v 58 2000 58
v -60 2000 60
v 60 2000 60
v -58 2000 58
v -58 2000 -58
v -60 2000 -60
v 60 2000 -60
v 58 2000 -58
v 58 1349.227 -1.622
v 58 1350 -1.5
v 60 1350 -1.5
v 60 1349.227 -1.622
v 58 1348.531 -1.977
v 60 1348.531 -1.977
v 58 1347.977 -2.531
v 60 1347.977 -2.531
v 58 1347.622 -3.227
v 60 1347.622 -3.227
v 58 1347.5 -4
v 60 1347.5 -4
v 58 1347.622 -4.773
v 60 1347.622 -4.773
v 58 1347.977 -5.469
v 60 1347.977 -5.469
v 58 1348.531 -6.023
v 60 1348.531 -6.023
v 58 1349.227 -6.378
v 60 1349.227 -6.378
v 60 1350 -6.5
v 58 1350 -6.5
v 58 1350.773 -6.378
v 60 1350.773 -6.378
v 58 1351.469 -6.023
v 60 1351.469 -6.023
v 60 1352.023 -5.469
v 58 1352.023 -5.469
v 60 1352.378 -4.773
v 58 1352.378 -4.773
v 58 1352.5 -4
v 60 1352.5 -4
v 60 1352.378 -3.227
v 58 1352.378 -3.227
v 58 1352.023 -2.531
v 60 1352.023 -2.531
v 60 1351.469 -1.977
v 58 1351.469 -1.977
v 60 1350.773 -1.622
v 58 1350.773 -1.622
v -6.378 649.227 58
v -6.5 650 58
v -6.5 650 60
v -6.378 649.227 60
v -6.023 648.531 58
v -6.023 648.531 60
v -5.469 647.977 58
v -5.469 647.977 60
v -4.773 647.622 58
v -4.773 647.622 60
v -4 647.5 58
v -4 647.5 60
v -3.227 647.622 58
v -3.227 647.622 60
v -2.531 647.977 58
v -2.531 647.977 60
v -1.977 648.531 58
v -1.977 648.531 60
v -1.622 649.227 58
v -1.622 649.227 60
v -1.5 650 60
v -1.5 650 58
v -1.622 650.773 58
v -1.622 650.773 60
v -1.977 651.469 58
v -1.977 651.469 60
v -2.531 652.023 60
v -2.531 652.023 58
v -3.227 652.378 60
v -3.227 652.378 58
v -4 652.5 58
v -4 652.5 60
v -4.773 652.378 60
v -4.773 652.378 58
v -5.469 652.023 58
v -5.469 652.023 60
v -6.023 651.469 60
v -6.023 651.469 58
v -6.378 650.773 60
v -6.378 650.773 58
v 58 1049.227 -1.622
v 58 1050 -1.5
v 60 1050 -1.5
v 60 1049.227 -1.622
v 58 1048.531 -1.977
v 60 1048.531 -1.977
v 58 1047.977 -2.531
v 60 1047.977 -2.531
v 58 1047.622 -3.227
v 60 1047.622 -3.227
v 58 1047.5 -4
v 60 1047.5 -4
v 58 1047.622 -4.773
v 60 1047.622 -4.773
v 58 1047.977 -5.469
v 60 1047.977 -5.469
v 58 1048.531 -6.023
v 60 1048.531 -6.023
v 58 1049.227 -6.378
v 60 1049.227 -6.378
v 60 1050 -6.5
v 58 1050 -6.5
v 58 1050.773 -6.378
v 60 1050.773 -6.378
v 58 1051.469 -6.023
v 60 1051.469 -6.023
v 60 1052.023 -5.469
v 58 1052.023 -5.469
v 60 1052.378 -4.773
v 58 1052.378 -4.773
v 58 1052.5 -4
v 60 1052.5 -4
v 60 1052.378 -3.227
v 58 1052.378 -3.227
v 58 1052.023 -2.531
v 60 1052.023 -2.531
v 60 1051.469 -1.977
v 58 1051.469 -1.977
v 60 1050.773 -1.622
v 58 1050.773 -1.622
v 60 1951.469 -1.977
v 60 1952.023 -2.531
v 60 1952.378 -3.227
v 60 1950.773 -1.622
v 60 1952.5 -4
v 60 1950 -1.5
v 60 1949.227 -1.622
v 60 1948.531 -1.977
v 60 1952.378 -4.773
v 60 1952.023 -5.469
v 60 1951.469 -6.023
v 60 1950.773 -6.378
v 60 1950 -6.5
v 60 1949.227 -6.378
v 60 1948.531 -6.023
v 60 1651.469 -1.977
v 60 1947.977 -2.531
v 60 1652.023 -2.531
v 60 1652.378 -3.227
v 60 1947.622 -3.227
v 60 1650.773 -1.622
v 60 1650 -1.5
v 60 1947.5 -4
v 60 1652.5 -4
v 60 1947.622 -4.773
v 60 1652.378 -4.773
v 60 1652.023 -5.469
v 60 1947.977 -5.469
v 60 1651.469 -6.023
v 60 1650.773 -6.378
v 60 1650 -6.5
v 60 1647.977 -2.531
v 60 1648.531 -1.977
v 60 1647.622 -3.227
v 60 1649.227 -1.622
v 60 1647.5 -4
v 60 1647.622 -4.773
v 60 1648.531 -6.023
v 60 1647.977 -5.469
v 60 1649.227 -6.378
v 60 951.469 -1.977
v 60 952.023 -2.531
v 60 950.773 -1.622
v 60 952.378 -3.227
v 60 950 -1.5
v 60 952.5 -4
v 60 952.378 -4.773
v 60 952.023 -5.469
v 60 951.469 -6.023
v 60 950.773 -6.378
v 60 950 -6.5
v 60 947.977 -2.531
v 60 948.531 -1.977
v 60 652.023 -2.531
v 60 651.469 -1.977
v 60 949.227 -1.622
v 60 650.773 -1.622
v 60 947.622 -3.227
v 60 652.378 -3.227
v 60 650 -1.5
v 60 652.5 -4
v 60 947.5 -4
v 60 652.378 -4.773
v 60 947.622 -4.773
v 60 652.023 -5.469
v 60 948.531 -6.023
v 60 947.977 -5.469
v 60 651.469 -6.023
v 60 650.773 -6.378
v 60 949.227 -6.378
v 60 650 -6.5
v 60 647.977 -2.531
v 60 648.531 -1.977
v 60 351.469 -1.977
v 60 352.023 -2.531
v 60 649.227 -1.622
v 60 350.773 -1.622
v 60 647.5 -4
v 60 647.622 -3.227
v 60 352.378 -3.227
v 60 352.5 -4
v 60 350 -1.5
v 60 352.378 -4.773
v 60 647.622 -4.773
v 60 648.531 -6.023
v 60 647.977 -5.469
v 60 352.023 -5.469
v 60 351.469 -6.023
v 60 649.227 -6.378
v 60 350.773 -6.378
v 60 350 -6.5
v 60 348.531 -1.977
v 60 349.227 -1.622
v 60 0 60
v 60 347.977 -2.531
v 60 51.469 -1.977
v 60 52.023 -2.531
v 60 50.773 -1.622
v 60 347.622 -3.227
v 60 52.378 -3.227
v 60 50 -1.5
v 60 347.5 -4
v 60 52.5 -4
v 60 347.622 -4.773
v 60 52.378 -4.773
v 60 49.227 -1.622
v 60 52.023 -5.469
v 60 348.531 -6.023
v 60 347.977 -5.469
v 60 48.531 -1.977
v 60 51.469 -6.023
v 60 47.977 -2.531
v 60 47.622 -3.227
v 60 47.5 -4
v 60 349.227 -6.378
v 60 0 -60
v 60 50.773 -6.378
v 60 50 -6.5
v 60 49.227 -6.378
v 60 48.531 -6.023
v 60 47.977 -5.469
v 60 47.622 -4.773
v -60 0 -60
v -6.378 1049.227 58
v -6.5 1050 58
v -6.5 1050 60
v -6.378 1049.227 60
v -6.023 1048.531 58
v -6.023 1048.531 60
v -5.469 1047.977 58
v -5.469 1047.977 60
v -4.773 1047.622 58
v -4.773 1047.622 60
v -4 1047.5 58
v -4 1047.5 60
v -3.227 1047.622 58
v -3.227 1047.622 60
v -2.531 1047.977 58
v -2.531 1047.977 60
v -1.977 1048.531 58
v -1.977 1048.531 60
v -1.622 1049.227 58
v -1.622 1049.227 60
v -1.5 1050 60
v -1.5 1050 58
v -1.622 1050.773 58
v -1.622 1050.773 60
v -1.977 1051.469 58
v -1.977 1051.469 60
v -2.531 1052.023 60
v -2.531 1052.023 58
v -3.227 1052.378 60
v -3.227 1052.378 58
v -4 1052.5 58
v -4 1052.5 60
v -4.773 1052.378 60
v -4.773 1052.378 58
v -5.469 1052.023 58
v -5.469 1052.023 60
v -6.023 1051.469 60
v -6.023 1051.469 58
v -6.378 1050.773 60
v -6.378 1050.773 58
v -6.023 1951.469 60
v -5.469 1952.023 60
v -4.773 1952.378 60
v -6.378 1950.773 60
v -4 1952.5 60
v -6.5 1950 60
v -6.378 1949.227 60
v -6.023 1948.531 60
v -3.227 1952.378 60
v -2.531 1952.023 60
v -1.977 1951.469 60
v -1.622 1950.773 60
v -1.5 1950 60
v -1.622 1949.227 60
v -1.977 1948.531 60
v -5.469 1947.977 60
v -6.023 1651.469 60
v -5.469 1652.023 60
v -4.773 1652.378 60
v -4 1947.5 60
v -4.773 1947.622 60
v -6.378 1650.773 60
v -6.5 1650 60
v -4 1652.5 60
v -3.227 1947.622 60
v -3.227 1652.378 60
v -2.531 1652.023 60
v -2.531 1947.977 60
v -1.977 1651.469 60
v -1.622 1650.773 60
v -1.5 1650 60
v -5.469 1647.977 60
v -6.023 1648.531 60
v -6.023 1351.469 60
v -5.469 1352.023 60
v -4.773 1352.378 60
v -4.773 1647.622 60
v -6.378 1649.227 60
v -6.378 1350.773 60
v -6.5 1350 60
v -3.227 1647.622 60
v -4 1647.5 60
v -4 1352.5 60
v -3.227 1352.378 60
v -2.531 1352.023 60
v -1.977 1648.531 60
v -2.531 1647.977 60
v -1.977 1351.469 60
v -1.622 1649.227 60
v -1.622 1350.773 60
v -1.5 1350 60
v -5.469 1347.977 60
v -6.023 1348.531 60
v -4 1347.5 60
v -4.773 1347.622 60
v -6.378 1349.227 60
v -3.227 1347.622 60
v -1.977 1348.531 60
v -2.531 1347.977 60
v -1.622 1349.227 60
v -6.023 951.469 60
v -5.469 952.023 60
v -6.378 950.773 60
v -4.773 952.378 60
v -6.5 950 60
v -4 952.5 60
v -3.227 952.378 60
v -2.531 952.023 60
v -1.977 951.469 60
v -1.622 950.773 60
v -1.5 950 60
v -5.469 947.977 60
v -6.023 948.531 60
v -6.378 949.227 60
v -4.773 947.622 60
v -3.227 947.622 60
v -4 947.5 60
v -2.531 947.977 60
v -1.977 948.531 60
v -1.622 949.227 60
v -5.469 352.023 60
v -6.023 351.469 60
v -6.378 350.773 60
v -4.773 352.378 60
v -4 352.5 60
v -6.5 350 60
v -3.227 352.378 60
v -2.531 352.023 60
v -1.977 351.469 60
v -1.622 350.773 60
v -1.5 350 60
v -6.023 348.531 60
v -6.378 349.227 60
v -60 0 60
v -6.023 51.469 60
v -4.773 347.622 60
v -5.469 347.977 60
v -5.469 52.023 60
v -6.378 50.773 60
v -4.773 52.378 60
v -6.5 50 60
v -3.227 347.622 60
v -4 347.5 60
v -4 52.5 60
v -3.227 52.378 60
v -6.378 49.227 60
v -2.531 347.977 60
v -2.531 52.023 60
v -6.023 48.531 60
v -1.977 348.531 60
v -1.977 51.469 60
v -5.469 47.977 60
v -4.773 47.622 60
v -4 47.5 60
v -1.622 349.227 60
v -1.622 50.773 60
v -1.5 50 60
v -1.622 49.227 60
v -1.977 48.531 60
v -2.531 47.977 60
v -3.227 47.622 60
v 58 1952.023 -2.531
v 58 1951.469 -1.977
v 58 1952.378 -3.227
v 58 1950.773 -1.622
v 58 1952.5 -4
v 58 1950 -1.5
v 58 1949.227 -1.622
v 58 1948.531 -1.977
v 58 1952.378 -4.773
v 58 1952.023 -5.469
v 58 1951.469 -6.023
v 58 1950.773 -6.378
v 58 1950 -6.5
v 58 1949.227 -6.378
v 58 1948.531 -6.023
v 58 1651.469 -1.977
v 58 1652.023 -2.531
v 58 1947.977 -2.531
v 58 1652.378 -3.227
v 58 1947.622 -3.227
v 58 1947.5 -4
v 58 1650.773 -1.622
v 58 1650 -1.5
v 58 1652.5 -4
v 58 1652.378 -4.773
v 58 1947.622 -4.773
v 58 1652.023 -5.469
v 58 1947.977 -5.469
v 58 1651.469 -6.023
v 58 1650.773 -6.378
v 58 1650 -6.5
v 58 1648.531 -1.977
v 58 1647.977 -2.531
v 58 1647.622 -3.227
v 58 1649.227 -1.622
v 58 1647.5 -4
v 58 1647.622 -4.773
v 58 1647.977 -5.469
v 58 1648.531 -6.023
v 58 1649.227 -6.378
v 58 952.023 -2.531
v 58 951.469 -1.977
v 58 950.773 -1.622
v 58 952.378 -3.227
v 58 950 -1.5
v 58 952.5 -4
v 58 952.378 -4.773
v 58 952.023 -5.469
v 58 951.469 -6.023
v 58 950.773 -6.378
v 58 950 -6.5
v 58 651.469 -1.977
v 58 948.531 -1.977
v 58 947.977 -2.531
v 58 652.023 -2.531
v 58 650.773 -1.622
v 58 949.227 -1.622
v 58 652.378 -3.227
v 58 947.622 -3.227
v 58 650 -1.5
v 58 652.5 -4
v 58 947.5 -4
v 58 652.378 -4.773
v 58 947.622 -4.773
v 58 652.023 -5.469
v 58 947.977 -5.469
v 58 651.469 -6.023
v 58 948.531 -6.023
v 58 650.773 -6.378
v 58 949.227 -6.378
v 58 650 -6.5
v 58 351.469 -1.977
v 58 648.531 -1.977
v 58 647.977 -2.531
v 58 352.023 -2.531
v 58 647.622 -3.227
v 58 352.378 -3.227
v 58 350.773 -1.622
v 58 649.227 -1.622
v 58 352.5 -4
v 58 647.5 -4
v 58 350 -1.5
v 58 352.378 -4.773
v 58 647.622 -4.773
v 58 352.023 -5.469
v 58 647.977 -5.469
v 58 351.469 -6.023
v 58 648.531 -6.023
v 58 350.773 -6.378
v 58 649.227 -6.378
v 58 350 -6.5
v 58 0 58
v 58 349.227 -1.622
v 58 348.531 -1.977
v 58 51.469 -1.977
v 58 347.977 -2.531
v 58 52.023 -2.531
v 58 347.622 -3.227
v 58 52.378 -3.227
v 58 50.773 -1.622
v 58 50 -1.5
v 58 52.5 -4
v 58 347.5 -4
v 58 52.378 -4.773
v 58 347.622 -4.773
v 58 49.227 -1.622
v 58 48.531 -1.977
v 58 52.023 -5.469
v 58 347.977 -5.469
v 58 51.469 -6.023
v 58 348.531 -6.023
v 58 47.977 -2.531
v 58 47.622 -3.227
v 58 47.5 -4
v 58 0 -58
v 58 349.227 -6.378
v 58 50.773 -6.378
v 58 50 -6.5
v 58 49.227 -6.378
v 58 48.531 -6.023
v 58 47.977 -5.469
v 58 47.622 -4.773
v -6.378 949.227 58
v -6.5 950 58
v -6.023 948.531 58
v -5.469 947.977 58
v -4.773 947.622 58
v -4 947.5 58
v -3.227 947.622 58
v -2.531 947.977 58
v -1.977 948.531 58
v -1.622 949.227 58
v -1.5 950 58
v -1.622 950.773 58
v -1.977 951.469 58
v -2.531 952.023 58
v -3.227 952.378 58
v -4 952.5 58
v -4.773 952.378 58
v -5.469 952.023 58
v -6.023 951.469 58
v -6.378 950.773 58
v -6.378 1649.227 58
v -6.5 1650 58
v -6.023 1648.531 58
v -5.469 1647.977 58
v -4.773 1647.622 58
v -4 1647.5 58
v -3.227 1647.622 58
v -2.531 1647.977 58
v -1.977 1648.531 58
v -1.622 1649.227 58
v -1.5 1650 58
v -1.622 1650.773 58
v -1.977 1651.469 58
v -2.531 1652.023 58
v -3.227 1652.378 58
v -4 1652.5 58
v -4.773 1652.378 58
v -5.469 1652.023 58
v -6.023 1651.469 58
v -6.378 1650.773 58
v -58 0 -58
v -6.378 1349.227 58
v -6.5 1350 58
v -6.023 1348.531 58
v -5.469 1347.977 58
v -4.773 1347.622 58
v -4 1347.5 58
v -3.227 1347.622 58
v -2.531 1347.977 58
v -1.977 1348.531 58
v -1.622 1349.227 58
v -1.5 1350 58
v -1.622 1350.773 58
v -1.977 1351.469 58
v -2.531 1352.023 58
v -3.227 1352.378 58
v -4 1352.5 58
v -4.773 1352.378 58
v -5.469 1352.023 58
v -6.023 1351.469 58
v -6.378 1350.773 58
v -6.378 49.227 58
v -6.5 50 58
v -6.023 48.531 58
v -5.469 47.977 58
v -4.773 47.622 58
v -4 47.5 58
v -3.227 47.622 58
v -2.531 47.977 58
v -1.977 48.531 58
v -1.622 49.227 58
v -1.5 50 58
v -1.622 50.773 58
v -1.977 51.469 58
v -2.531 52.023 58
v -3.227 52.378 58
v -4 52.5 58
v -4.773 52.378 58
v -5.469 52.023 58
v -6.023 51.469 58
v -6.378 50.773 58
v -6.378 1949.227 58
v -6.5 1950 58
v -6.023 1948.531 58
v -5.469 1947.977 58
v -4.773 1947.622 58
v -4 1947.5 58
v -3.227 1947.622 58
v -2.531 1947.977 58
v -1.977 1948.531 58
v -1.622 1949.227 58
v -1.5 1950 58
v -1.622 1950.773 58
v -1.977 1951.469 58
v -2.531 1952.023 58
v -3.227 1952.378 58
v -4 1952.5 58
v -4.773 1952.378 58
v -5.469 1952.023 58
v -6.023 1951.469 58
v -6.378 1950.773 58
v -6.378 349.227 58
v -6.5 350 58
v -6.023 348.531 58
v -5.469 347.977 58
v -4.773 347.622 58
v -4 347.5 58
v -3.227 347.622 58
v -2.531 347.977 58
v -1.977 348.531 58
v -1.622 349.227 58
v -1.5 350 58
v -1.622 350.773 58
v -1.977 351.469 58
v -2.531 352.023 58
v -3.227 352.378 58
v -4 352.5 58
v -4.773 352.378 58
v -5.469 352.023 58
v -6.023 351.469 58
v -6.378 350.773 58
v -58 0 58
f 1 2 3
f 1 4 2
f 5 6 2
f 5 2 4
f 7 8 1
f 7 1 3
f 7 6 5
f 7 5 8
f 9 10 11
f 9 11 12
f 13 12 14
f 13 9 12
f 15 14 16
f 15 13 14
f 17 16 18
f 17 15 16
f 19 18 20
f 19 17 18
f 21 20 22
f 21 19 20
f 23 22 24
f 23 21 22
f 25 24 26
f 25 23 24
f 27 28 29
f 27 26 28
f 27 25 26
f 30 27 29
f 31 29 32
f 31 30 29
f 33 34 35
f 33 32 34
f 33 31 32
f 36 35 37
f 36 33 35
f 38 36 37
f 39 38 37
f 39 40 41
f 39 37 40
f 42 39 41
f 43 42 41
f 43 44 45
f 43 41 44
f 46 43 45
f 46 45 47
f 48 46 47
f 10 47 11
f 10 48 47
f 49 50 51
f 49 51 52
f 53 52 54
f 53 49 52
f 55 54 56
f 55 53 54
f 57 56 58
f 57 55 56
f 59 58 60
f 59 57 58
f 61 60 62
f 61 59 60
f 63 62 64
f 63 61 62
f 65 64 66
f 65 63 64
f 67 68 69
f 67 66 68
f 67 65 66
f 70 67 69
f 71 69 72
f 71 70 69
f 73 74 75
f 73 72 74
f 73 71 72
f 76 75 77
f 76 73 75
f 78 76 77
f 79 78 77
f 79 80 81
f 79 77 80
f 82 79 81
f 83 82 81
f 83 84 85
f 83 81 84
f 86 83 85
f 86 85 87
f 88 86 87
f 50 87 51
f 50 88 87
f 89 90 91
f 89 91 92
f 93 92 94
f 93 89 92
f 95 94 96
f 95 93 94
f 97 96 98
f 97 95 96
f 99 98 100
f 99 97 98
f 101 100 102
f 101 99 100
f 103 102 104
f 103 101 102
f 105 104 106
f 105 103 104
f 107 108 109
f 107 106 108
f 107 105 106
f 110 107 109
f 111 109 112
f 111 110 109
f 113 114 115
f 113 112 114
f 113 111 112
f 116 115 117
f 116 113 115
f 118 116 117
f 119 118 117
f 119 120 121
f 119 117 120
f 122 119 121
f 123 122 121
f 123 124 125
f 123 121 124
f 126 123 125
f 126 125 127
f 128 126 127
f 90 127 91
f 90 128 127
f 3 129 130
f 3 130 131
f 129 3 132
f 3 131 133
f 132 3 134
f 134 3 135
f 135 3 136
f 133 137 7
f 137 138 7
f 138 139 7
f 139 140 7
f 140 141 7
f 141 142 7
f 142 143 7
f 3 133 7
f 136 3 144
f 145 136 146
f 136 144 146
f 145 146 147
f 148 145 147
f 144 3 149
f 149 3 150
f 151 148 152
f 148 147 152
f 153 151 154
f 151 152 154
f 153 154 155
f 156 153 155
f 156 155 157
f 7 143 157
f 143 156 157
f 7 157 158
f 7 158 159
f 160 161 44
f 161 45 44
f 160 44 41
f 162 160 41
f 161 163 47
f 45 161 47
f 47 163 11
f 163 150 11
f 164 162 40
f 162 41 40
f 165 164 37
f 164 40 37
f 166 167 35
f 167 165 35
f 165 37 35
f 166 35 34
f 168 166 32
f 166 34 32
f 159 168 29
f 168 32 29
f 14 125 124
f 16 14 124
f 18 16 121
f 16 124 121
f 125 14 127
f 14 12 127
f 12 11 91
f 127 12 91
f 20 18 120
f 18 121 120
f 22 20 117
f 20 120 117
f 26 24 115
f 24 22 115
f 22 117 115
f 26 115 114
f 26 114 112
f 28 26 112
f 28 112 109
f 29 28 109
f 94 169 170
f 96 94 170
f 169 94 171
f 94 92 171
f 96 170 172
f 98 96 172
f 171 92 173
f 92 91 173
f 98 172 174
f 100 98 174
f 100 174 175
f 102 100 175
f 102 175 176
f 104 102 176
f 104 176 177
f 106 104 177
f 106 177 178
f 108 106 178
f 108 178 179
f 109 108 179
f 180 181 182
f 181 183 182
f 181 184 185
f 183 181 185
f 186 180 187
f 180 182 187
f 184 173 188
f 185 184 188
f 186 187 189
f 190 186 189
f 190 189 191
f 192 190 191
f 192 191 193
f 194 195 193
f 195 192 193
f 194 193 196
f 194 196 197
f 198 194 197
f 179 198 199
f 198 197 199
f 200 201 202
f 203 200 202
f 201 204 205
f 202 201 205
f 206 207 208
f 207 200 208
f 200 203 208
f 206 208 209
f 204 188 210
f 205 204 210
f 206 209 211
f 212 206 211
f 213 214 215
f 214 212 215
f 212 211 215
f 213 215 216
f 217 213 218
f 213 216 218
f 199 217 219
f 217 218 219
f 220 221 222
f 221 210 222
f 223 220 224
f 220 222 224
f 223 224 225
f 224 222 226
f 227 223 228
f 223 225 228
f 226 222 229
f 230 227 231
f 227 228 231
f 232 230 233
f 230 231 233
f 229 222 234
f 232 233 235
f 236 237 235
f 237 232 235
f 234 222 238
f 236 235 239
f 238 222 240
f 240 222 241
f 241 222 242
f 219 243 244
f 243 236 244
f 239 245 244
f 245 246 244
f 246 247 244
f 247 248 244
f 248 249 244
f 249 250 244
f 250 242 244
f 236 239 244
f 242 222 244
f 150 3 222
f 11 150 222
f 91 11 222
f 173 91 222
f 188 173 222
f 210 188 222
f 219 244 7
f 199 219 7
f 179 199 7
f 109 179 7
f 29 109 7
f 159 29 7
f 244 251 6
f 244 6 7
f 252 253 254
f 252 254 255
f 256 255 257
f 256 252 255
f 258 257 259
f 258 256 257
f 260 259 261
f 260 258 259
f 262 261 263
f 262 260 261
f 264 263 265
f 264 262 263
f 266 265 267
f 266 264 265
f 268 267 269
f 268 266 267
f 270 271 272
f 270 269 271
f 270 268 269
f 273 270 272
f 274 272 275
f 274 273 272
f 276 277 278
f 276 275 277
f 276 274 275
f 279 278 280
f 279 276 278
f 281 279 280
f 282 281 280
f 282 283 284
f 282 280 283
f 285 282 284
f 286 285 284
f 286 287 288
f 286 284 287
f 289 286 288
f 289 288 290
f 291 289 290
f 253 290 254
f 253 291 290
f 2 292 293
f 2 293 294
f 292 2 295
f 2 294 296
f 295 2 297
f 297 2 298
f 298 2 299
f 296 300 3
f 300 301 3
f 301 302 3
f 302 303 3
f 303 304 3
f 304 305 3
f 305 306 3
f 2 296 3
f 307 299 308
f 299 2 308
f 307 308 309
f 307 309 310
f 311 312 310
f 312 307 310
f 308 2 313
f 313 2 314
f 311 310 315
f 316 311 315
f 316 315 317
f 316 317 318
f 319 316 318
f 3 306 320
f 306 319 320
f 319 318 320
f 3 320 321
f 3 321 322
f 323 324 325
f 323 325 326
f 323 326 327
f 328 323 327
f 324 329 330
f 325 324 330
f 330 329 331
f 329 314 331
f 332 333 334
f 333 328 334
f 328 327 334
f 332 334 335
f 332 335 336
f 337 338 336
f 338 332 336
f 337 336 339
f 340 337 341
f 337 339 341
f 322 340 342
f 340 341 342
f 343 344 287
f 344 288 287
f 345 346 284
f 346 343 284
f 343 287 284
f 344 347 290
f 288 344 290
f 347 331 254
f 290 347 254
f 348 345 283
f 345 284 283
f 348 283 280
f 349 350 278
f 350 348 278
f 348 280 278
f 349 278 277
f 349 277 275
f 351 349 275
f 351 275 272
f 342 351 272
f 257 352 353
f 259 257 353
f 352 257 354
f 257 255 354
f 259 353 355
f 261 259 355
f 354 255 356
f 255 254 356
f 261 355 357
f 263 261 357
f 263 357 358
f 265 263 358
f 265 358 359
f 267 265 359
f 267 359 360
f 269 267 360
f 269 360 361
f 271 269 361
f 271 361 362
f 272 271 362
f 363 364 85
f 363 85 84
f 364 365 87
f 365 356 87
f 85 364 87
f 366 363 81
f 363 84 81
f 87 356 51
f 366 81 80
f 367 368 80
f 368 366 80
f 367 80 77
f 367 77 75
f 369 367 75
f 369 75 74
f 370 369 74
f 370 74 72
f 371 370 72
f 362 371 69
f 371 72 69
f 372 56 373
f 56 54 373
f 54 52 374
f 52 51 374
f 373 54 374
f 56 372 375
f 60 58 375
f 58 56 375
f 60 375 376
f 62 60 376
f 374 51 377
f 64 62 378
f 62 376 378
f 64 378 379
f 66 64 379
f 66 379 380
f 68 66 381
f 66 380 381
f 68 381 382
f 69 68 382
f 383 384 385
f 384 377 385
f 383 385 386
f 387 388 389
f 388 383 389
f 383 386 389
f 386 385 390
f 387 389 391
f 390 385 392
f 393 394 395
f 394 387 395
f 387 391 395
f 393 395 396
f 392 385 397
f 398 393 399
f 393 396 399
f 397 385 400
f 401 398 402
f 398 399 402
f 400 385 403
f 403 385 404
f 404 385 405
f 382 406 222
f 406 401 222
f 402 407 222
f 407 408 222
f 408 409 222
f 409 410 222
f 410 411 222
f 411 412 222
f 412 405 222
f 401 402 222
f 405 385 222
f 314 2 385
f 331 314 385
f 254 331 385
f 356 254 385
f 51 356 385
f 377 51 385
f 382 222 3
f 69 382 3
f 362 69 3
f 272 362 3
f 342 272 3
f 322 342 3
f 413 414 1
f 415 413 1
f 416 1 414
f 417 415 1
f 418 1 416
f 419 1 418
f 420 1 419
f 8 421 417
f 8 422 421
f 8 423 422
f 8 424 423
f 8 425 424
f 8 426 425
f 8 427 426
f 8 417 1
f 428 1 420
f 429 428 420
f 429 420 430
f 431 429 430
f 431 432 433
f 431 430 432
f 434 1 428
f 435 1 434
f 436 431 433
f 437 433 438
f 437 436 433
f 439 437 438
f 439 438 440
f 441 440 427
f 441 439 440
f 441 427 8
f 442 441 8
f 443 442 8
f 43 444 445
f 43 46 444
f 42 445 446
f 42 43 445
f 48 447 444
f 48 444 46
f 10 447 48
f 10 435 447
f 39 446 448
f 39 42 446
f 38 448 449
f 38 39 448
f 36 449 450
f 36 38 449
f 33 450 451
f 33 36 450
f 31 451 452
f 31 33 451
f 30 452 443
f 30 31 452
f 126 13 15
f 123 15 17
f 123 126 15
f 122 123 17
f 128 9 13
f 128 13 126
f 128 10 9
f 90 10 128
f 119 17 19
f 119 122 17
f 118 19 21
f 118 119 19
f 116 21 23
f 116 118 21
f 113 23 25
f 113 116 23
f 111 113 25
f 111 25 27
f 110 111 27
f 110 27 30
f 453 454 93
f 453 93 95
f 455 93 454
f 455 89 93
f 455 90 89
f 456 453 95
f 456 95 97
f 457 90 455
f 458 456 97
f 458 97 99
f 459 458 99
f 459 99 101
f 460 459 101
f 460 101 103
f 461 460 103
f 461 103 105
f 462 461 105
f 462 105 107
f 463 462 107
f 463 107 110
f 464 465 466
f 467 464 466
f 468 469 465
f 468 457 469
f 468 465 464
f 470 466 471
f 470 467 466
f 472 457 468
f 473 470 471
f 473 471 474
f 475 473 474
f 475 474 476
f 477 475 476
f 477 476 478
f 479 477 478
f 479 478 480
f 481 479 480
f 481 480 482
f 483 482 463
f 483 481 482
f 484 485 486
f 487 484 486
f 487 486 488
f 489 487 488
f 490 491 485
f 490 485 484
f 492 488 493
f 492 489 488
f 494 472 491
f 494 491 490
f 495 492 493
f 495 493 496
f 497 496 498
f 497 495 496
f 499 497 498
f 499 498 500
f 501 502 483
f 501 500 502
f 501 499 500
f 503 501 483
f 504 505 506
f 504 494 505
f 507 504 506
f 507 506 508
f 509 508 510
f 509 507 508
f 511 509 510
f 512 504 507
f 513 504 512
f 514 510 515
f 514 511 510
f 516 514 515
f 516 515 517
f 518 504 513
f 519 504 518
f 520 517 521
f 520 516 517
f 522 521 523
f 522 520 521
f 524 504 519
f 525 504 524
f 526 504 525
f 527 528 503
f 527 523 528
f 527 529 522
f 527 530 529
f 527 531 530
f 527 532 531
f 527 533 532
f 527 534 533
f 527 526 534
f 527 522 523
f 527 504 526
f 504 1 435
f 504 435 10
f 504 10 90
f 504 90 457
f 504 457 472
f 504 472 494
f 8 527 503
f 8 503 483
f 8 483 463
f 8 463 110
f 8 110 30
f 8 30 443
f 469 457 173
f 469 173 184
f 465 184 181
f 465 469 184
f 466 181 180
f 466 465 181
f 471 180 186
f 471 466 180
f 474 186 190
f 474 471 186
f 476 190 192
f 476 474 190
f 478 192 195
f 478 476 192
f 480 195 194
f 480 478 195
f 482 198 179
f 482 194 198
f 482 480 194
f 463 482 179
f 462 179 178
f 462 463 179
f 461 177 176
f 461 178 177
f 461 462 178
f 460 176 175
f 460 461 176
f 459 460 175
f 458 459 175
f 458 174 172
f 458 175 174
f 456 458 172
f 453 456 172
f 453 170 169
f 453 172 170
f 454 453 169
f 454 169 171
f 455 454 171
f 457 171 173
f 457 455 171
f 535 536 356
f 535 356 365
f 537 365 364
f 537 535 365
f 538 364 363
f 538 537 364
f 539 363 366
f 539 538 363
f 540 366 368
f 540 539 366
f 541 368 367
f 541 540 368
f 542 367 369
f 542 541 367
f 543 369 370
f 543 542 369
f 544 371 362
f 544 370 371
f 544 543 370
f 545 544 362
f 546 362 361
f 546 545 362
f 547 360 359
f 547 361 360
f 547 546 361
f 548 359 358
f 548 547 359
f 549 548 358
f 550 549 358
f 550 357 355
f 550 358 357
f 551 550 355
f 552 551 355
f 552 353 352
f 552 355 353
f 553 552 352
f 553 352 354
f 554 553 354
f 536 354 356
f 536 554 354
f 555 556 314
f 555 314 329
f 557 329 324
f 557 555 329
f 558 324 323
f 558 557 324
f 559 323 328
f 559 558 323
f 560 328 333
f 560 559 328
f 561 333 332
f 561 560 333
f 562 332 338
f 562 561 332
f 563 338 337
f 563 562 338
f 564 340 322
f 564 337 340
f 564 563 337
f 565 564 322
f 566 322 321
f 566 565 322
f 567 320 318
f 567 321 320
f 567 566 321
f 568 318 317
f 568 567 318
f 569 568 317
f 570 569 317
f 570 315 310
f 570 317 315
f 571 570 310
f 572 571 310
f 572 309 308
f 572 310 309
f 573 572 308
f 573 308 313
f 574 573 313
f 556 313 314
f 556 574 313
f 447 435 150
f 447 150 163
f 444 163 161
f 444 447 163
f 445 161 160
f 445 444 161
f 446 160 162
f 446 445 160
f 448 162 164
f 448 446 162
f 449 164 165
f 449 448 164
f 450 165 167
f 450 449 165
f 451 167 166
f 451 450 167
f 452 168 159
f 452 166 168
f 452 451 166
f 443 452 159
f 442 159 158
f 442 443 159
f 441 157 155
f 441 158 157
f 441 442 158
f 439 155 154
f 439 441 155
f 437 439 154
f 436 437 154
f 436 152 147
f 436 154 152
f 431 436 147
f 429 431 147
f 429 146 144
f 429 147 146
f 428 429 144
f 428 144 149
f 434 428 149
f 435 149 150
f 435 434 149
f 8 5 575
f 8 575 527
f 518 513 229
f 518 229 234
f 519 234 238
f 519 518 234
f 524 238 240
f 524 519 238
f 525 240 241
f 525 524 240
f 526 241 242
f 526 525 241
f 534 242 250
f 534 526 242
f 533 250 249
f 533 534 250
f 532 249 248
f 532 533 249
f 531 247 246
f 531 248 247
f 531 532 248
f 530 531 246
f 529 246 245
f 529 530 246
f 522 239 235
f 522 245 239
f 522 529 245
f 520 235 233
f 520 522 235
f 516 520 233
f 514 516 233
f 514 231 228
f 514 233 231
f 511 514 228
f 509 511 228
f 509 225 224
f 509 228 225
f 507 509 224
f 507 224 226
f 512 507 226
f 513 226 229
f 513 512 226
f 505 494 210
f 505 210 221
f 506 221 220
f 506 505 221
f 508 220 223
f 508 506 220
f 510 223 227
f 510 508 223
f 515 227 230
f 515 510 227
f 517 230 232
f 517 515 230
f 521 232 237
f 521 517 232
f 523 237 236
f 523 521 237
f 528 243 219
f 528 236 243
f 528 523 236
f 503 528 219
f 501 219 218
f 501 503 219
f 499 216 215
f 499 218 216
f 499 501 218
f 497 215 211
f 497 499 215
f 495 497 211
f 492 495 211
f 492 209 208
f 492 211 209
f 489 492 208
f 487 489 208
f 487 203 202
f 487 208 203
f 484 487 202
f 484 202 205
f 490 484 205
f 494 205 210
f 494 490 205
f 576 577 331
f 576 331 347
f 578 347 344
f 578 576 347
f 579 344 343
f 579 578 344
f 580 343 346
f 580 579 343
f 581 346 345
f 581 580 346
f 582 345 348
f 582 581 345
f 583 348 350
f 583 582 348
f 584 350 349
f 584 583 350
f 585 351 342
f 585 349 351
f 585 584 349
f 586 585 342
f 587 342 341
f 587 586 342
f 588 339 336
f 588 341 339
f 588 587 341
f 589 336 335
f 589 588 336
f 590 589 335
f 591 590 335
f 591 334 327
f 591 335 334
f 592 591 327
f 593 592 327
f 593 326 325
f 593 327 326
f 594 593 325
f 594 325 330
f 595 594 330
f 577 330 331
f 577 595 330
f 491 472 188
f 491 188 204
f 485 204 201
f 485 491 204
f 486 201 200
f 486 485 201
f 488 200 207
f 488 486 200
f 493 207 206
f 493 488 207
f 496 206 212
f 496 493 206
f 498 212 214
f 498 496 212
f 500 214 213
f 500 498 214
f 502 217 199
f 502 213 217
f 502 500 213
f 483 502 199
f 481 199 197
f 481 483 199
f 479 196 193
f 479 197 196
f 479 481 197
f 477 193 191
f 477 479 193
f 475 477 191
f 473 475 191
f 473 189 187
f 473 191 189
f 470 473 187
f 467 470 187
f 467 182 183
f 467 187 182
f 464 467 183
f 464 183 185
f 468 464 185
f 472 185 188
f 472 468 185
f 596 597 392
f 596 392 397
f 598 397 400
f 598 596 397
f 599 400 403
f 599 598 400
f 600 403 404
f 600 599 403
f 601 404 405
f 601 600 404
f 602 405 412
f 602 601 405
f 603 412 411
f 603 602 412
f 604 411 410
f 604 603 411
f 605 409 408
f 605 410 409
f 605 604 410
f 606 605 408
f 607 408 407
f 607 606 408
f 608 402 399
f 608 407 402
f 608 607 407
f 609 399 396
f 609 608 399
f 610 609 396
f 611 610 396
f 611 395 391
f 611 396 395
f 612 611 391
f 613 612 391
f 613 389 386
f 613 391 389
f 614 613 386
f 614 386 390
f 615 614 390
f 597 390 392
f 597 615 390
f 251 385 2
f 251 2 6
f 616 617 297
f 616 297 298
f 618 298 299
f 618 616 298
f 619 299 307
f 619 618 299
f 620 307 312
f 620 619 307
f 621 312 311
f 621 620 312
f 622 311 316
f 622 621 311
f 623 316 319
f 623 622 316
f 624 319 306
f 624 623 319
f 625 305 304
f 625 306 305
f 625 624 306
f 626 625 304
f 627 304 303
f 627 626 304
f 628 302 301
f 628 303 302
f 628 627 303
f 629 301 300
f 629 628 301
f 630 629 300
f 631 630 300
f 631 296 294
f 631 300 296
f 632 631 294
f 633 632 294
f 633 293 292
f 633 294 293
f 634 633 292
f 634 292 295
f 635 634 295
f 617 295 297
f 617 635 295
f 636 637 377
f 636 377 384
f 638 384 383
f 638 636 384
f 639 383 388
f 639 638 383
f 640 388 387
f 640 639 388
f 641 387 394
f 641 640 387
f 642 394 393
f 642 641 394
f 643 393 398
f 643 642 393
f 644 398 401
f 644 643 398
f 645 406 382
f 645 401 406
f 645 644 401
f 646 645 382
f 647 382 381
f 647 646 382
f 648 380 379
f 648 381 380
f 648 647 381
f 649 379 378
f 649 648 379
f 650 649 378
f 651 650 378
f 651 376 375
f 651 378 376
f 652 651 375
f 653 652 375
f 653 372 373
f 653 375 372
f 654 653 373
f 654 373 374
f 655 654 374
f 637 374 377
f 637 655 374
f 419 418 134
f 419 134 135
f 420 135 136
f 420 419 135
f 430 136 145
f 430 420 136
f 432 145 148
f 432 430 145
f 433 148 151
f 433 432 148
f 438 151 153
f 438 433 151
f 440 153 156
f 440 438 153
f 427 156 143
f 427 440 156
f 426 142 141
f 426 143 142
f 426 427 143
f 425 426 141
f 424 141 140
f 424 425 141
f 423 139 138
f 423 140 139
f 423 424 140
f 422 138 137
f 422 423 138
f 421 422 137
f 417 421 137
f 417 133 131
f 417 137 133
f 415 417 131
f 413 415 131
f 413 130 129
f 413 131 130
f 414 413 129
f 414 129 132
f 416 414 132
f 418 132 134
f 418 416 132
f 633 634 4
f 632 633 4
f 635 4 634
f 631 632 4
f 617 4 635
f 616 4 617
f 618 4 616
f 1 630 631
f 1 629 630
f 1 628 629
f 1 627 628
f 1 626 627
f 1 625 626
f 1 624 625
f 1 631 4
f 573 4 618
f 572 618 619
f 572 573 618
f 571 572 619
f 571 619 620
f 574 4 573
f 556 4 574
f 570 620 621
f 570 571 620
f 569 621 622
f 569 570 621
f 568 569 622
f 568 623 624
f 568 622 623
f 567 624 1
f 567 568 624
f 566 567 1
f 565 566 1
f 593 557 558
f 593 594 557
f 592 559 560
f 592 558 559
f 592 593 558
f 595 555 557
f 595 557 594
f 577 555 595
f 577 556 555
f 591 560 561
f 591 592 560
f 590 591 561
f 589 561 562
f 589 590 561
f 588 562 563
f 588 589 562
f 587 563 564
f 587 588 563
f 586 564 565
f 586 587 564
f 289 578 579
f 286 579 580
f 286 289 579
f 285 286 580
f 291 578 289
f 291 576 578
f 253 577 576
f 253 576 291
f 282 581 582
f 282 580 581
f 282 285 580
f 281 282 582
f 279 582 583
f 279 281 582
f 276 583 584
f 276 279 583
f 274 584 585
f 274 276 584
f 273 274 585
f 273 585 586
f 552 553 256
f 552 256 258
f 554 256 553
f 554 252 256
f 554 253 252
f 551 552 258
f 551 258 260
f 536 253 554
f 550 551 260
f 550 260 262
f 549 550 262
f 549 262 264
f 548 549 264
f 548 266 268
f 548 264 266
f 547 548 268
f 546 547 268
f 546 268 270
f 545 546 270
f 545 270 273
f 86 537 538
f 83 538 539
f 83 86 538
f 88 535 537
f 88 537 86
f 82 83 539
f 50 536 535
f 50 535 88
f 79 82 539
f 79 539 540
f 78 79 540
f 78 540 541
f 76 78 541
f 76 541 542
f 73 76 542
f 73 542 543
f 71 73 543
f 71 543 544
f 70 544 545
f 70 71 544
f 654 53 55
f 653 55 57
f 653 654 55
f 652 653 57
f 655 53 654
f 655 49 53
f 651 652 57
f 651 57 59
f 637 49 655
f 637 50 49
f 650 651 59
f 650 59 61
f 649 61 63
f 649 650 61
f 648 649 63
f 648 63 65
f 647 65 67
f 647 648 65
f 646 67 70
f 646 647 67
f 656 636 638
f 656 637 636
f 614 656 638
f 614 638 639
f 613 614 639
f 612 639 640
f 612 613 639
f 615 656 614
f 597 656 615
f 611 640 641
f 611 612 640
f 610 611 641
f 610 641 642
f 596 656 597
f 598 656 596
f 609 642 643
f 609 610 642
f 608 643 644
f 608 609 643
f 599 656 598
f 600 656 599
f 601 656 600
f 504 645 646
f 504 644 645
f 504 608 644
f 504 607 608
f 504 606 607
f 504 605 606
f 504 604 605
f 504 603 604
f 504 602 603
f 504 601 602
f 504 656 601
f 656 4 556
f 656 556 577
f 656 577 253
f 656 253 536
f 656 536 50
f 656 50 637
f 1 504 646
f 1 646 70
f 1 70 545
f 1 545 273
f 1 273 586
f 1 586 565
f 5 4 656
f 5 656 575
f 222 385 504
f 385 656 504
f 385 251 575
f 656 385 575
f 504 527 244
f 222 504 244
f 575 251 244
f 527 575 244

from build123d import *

# Parameters (mm, degrees)
SKETCH_1_W          = 120
SKETCH_1_H          = 120
SKETCH_1_W_2        = 116
SKETCH_1_H_2        = 116
EXTRUDE_1_DEPTH     = 2000
SKETCH_2_R          = 2.5
CUT_EXTRUDE_1_DEPTH = 2002.799190728
SKETCH_3_R          = 2.5
CUT_EXTRUDE_2_DEPTH = 2002.799190728


with BuildPart() as part:
    # 草图1 → 拉伸-薄壁1 (new body)
    with BuildSketch(Plane(origin=(0, 0, 0), x_dir=(1, 0, 0), z_dir=(0, 1, 0))):
        Rectangle(SKETCH_1_W, SKETCH_1_H)
        Rectangle(SKETCH_1_W_2, SKETCH_1_H_2, mode=Mode.SUBTRACT)
    extrude(amount=EXTRUDE_1_DEPTH)

    # 草图2 → 切除-拉伸1 (cut, through all)
    with BuildSketch(Plane(origin=(0, 0, 0), x_dir=(0, 0, -1), z_dir=(1, 0, 0))):
        with Locations(Location((4, 50, 0), (0, 0, 180))):
            Circle(SKETCH_2_R)
        with Locations(Location((4, 350, 0), (0, 0, 180))):
            Circle(SKETCH_2_R)
        with Locations(Location((4, 650, 0), (0, 0, 180))):
            Circle(SKETCH_2_R)
        with Locations(Location((4, 950, 0), (0, 0, 180))):
            Circle(SKETCH_2_R)
        with Locations(Location((4, 1950, 0), (0, 0, 180))):
            Circle(SKETCH_2_R)
        with Locations(Location((4, 1650, 0), (0, 0, 180))):
            Circle(SKETCH_2_R)
        with Locations(Location((4, 1350, 0), (0, 0, 180))):
            Circle(SKETCH_2_R)
        with Locations(Location((4, 1050, 0), (0, 0, 180))):
            Circle(SKETCH_2_R)
    extrude(amount=CUT_EXTRUDE_1_DEPTH, mode=Mode.SUBTRACT)

    # 草图3 → 切除-拉伸2 (cut, through all)
    with BuildSketch(Plane.XY):
        with Locations(Location((-4, 50, 0), (0, 0, 180))):
            Circle(SKETCH_3_R)
        with Locations(Location((-4, 350, 0), (0, 0, 180))):
            Circle(SKETCH_3_R)
        with Locations(Location((-4, 650, 0), (0, 0, 180))):
            Circle(SKETCH_3_R)
        with Locations(Location((-4, 950, 0), (0, 0, 180))):
            Circle(SKETCH_3_R)
        with Locations(Location((-4, 1950, 0), (0, 0, 180))):
            Circle(SKETCH_3_R)
        with Locations(Location((-4, 1650, 0), (0, 0, 180))):
            Circle(SKETCH_3_R)
        with Locations(Location((-4, 1350, 0), (0, 0, 180))):
            Circle(SKETCH_3_R)
        with Locations(Location((-4, 1050, 0), (0, 0, 180))):
            Circle(SKETCH_3_R)
    extrude(amount=CUT_EXTRUDE_2_DEPTH, mode=Mode.SUBTRACT)


solid = part.part
